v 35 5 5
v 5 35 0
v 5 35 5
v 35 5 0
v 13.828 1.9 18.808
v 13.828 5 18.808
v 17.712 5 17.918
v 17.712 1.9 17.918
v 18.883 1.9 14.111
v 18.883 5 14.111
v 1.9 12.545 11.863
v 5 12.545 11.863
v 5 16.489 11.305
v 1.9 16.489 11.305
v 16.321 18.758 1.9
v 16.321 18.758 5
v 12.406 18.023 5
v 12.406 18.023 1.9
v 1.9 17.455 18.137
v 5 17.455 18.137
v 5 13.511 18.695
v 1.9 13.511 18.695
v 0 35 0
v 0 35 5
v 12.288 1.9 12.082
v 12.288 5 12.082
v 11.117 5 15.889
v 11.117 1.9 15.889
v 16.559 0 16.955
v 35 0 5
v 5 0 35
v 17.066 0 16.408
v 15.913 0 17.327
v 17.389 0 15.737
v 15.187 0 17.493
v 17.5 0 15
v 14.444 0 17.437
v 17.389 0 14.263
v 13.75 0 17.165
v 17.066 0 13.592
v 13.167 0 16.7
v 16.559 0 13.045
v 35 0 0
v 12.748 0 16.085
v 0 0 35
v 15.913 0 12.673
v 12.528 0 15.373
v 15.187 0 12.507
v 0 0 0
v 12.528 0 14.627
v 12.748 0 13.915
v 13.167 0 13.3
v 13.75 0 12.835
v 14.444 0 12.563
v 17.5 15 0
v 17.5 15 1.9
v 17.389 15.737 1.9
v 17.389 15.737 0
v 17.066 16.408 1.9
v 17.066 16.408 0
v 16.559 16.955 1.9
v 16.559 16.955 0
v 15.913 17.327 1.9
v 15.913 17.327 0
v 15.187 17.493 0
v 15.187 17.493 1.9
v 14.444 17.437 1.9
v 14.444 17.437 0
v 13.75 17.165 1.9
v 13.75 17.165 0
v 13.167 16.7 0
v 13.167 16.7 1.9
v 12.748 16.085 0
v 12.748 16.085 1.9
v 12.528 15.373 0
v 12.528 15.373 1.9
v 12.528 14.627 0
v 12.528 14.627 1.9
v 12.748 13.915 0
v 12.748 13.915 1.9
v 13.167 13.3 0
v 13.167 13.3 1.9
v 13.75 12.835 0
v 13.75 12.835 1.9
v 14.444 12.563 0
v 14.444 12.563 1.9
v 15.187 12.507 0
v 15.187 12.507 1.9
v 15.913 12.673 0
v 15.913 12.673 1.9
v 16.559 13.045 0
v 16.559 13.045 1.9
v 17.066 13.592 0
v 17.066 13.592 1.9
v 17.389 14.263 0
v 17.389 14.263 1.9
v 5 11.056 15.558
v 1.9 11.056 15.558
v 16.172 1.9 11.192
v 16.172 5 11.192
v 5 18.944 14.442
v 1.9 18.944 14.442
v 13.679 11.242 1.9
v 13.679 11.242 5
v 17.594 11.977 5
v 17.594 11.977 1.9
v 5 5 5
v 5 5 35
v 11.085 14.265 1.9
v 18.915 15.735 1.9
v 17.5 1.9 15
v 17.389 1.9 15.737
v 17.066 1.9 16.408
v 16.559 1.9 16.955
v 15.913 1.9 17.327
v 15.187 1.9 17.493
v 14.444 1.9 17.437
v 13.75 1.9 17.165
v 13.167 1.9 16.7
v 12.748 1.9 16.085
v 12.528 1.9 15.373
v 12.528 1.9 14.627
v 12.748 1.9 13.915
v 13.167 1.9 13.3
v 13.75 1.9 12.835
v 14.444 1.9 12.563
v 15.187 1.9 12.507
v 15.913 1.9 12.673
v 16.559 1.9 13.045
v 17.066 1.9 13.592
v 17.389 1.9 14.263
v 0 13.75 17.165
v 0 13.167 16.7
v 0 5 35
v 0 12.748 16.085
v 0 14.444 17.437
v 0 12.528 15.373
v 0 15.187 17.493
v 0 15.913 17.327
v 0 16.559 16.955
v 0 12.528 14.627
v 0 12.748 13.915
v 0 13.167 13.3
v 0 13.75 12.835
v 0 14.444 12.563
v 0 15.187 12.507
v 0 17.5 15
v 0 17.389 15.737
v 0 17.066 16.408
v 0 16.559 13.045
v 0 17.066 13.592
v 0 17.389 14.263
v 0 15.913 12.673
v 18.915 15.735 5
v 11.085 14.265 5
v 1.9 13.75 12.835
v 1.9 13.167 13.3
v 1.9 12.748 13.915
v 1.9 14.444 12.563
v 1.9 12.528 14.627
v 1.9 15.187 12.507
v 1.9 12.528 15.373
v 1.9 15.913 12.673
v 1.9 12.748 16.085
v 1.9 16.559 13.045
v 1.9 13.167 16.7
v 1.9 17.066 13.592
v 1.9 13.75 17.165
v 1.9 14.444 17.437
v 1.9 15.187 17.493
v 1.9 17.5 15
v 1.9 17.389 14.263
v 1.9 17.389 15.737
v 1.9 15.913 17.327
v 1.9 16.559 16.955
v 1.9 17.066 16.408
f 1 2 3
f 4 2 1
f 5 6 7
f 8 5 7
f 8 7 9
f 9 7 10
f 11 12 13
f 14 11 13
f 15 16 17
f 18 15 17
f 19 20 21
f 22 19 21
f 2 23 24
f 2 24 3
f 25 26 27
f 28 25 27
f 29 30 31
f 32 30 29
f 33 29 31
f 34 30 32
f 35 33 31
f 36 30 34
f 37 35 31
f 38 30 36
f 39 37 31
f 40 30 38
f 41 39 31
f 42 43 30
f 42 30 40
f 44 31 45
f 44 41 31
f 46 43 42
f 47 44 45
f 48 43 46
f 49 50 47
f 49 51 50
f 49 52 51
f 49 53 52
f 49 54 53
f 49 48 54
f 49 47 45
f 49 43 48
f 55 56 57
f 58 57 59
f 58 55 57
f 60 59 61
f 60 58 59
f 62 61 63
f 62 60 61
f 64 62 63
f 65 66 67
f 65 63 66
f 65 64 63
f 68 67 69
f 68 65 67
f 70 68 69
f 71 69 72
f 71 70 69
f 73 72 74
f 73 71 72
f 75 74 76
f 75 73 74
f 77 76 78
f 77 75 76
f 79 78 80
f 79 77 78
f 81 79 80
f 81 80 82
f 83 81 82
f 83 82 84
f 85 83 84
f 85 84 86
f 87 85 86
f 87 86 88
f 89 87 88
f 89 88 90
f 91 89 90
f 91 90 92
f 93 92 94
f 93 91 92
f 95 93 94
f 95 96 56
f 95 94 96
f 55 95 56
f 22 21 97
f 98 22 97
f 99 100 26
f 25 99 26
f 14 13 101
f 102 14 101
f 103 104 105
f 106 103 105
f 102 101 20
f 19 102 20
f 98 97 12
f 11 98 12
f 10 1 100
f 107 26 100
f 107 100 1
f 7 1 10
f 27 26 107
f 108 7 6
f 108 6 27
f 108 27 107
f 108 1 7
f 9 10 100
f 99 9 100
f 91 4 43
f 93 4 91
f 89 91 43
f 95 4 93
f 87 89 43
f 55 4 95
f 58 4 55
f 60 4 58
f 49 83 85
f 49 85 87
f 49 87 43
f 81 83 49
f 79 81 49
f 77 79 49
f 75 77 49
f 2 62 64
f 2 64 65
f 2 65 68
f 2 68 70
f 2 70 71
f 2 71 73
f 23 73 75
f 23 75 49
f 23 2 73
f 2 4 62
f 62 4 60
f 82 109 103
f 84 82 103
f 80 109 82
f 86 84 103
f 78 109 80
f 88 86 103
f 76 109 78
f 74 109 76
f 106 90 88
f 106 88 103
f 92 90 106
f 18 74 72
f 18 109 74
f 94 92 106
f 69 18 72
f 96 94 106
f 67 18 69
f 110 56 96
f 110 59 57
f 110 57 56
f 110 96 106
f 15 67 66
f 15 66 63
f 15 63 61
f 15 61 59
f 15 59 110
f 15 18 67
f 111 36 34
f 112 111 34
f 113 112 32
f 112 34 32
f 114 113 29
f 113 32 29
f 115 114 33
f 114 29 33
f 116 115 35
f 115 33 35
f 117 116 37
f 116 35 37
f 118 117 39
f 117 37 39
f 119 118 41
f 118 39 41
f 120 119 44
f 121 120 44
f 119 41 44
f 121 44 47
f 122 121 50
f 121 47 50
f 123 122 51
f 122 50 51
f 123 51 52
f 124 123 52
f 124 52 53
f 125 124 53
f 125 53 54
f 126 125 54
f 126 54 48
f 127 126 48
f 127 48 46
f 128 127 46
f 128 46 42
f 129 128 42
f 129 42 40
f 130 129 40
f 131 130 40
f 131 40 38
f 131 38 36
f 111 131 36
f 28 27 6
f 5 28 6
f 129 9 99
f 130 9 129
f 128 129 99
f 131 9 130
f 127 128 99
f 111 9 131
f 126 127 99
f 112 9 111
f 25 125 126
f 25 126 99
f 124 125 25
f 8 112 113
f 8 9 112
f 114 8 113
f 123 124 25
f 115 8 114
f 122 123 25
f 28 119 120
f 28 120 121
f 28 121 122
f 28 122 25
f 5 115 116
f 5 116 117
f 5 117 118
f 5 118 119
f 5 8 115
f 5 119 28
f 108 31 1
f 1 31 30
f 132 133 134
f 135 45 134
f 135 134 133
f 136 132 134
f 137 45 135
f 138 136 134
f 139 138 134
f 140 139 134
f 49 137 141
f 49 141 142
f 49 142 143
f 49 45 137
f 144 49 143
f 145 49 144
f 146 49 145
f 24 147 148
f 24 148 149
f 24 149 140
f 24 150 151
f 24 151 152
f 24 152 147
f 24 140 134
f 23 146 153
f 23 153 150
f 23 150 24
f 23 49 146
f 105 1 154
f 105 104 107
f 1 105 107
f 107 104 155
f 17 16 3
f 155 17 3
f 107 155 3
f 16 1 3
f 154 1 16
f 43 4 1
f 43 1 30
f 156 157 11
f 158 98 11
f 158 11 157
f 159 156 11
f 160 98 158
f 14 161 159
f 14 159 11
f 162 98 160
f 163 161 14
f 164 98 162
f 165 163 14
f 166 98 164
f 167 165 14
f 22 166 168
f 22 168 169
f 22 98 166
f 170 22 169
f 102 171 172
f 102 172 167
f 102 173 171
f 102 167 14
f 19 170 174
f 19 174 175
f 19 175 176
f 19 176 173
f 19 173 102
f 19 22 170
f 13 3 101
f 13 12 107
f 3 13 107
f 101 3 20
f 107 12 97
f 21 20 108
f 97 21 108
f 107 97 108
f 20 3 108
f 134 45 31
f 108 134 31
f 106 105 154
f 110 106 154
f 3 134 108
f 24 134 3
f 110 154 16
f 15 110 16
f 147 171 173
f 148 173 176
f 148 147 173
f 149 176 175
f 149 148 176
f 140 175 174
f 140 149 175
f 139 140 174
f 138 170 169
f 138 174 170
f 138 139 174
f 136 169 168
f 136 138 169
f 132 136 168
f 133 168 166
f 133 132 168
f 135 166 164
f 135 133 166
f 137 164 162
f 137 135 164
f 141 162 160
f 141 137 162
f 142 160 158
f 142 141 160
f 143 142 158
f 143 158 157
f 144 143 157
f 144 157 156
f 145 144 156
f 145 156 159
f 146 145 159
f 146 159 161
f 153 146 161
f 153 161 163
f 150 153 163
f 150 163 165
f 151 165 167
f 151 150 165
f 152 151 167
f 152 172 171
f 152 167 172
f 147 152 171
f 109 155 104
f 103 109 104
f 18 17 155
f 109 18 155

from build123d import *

# Parameters (mm, degrees)
SKETCH_R        = 2.5
PAD_DEPTH       = 5
SKETCH001_R     = 2.5
PAD001_DEPTH    = 5
SKETCH002_R     = 2.5
PAD002_DEPTH    = 5
POCKET_DEPTH    = 3.1
POCKET001_DEPTH = 3.1
POCKET002_DEPTH = 3.1


with BuildPart() as part:
    # Sketch → Pad (new body)
    with BuildSketch(Plane.XY):
        Polygon((0, 0), (0, 35), (5, 35), (35, 5), (35, 0), align=None)
        with Locations((15, 15)):
            Circle(SKETCH_R, mode=Mode.SUBTRACT)
    extrude(amount=PAD_DEPTH)

    # Sketch001 → Pad001 (join)
    with BuildSketch(Plane.XZ):
        Polygon((0, 0), (0, 35), (5, 35), (35, 5), (35, 0), align=None)
        with Locations((15, 15)):
            Circle(SKETCH001_R, mode=Mode.SUBTRACT)
    extrude(amount=-PAD001_DEPTH)

    # Sketch002 → Pad002 (join)
    with BuildSketch(Plane.YZ):
        Polygon((0, 0), (0, 35), (5, 35), (35, 5), (35, 0), align=None)
        with Locations((15, 15)):
            Circle(SKETCH002_R, mode=Mode.SUBTRACT)
    extrude(amount=PAD002_DEPTH)

    # Sketch003 (on Face11 of Pad002) → Pocket (cut)
    with BuildSketch(Plane(origin=(0, 5, 0), x_dir=(-1, 0, 0), z_dir=(0, 1, 0))):
        Polygon((-13.828396, 18.807538), (-17.711622, 17.918408), (-18.883227, 14.11087), (-16.171604, 11.192462), (-12.288378, 12.081592), (-11.116773, 15.88913), align=None)
    extrude(amount=-POCKET_DEPTH, mode=Mode.SUBTRACT)

    # Sketch004 (on Face10 of Pocket) → Pocket001 (cut)
    with BuildSketch(Plane.XY.offset(5)):
        Polygon((16.321291, 18.758216), (12.405934, 18.023379), (11.084644, 14.265163), (13.678709, 11.241784), (17.594066, 11.976621), (18.915356, 15.734837), align=None)
    extrude(amount=-POCKET001_DEPTH, mode=Mode.SUBTRACT)

    # Sketch005 (on Face12 of Pocket001) → Pocket002 (cut)
    with BuildSketch(Plane.YZ.offset(5)):
        Polygon((18.944452, 14.442056), (17.45542, 18.137023), (13.510968, 18.694967), (11.055548, 15.557944), (12.54458, 11.862977), (16.489032, 11.305033), align=None)
    extrude(amount=-POCKET002_DEPTH, mode=Mode.SUBTRACT)


solid = part.part
